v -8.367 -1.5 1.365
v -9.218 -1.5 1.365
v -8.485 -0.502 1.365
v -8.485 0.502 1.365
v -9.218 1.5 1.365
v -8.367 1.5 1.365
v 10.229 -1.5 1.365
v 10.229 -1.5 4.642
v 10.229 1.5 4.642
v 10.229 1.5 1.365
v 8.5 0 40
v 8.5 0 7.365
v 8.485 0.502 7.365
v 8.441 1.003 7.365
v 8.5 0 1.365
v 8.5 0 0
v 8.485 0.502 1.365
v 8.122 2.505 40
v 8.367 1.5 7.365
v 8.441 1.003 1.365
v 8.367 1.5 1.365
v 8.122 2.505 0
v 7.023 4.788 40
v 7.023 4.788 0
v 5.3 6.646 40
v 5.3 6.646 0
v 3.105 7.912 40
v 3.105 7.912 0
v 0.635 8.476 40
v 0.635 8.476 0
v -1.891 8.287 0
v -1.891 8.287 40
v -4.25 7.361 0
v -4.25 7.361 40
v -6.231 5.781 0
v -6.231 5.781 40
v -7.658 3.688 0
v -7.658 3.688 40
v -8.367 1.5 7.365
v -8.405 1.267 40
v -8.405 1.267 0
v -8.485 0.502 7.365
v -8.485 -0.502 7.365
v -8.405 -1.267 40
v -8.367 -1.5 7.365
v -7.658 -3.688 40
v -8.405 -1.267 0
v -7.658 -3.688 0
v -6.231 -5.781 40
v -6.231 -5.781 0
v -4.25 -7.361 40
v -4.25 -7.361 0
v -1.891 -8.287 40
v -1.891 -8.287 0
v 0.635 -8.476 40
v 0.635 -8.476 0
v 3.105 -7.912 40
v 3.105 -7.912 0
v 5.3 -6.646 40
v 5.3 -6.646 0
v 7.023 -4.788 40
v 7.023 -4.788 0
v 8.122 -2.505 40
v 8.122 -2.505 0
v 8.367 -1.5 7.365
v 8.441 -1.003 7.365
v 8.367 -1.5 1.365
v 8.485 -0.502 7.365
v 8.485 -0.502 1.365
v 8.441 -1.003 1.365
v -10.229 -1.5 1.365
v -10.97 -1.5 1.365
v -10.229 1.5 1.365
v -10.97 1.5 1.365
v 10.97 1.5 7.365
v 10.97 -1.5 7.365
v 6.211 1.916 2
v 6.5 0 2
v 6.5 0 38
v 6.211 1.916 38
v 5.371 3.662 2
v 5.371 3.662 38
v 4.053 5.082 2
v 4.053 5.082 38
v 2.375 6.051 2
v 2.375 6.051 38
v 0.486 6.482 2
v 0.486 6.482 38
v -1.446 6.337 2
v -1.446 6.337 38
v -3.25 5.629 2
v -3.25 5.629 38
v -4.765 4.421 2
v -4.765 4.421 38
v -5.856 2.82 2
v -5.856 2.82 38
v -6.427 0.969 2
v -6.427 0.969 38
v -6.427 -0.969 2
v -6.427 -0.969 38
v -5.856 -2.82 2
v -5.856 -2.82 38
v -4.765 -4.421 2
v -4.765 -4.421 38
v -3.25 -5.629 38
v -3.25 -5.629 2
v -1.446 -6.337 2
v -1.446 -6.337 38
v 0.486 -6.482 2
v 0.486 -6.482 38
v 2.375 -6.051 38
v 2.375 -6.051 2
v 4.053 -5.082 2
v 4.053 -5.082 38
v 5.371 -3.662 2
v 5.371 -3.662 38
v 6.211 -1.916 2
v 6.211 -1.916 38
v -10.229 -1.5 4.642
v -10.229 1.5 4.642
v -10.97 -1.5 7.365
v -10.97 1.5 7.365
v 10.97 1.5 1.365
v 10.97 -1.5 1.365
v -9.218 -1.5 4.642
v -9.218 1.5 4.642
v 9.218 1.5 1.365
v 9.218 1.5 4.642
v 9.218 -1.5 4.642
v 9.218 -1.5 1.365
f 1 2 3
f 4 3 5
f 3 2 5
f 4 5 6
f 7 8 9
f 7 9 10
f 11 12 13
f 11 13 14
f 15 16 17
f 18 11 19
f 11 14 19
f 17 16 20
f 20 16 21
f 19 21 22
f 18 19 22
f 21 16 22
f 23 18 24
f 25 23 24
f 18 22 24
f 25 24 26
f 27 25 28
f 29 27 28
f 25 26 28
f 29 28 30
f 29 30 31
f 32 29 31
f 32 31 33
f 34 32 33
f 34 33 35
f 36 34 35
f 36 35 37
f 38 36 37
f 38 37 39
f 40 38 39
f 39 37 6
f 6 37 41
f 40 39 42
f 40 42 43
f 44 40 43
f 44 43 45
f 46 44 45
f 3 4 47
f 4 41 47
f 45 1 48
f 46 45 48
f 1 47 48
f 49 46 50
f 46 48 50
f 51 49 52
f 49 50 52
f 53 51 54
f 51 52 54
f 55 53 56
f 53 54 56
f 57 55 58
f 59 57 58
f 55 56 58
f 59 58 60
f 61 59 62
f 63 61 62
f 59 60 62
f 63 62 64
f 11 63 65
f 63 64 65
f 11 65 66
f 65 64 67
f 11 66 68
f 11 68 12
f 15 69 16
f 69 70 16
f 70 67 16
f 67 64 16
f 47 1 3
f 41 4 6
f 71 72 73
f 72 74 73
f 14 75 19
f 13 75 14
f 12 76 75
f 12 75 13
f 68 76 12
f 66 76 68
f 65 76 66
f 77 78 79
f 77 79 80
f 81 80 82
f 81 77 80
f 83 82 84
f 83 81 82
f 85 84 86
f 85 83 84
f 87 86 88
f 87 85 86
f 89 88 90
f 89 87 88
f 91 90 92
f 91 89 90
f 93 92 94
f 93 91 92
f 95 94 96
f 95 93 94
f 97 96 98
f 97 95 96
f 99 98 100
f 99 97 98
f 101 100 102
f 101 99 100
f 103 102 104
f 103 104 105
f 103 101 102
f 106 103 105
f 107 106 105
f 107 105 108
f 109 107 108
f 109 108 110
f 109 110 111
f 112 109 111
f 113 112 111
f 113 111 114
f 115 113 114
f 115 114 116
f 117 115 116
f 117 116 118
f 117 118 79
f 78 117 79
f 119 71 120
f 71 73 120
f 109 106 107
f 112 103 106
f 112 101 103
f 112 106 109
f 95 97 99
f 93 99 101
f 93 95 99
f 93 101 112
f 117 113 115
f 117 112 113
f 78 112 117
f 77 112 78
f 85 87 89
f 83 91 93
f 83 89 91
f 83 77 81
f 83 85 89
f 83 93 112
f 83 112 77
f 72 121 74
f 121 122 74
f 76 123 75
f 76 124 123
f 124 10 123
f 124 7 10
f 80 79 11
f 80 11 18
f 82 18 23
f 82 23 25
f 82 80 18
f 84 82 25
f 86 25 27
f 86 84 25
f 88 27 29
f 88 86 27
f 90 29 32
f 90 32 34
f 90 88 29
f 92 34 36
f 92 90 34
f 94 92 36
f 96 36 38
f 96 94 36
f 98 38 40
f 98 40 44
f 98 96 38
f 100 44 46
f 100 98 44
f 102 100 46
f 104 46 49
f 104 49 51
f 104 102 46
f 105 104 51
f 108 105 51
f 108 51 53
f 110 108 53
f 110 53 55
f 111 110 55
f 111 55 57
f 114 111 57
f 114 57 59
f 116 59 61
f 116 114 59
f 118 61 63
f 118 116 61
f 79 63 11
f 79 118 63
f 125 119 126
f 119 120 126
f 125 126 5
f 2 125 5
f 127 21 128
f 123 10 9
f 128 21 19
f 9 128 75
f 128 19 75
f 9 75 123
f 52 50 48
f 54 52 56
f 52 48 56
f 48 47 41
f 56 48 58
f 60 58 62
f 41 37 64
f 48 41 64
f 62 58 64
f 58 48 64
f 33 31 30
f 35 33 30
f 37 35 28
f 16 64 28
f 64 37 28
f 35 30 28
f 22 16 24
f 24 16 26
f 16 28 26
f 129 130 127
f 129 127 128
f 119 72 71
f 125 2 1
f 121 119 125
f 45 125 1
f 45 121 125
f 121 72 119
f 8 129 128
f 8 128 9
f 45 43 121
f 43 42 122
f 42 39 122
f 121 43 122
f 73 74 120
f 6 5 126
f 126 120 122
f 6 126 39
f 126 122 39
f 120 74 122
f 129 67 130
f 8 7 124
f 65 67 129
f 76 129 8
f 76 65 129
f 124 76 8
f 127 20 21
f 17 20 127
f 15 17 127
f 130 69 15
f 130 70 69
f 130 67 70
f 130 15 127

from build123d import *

# Parameters (mm, degrees)
F0_R     = 8.5
F1_DEPTH = 40
F2_T     = -2
F3_SIZE  = 1.99999
F5_DEPTH = 1.5


# Not quite as in the source:
# - a fillet or chamfer is up to 0.001 mm smaller than in the source, because OpenCascade refuses the exact size


with BuildPart() as f1:
    # F0 (on Top) → F1 (new body)
    with BuildSketch(Plane.XY):
        Circle(F0_R)
    extrude(amount=F1_DEPTH)

    # F2
    f2_openings = [f1.faces().sort_by_distance(p)[0] for p in [
        (0, 0, 40),
    ]]
    offset(amount=F2_T, openings=f2_openings)

    # F3 (size 2 in the source; OpenCascade refuses exactly that, so slightly less here)
    f3_edges = [f1.edges().sort_by_distance(p)[0] for p in [
        (-6.5, 0, 40),
    ]]
    chamfer(f3_edges, length=F3_SIZE)

    # F4 (on Front) → F5 (join, symmetric)
    with BuildSketch(Plane.XZ):
        Polygon((-8.2697293678, 1.3648961653), (-8.2697293678, 7.3648961653), (-10.9697293678, 7.3648961653), (-10.9697293678, 1.3648961653), (-10.2286748588, 1.3648961653), (-10.2286748588, 4.6420348808), (-9.2178666964, 4.6420348808), (-9.2178666964, 1.3648961653), align=None)
        Polygon((10.9697293678, 7.3648961653), (8.2697293678, 7.3648961653), (8.2697293678, 1.3648961653), (9.2178666964, 1.3648961653), (9.2178666964, 4.6420348808), (10.2286748588, 4.6420348808), (10.2286748588, 1.3648961653), (10.9697293678, 1.3648961653), align=None)
    extrude(amount=F5_DEPTH, both=True)


solid = f1.part
